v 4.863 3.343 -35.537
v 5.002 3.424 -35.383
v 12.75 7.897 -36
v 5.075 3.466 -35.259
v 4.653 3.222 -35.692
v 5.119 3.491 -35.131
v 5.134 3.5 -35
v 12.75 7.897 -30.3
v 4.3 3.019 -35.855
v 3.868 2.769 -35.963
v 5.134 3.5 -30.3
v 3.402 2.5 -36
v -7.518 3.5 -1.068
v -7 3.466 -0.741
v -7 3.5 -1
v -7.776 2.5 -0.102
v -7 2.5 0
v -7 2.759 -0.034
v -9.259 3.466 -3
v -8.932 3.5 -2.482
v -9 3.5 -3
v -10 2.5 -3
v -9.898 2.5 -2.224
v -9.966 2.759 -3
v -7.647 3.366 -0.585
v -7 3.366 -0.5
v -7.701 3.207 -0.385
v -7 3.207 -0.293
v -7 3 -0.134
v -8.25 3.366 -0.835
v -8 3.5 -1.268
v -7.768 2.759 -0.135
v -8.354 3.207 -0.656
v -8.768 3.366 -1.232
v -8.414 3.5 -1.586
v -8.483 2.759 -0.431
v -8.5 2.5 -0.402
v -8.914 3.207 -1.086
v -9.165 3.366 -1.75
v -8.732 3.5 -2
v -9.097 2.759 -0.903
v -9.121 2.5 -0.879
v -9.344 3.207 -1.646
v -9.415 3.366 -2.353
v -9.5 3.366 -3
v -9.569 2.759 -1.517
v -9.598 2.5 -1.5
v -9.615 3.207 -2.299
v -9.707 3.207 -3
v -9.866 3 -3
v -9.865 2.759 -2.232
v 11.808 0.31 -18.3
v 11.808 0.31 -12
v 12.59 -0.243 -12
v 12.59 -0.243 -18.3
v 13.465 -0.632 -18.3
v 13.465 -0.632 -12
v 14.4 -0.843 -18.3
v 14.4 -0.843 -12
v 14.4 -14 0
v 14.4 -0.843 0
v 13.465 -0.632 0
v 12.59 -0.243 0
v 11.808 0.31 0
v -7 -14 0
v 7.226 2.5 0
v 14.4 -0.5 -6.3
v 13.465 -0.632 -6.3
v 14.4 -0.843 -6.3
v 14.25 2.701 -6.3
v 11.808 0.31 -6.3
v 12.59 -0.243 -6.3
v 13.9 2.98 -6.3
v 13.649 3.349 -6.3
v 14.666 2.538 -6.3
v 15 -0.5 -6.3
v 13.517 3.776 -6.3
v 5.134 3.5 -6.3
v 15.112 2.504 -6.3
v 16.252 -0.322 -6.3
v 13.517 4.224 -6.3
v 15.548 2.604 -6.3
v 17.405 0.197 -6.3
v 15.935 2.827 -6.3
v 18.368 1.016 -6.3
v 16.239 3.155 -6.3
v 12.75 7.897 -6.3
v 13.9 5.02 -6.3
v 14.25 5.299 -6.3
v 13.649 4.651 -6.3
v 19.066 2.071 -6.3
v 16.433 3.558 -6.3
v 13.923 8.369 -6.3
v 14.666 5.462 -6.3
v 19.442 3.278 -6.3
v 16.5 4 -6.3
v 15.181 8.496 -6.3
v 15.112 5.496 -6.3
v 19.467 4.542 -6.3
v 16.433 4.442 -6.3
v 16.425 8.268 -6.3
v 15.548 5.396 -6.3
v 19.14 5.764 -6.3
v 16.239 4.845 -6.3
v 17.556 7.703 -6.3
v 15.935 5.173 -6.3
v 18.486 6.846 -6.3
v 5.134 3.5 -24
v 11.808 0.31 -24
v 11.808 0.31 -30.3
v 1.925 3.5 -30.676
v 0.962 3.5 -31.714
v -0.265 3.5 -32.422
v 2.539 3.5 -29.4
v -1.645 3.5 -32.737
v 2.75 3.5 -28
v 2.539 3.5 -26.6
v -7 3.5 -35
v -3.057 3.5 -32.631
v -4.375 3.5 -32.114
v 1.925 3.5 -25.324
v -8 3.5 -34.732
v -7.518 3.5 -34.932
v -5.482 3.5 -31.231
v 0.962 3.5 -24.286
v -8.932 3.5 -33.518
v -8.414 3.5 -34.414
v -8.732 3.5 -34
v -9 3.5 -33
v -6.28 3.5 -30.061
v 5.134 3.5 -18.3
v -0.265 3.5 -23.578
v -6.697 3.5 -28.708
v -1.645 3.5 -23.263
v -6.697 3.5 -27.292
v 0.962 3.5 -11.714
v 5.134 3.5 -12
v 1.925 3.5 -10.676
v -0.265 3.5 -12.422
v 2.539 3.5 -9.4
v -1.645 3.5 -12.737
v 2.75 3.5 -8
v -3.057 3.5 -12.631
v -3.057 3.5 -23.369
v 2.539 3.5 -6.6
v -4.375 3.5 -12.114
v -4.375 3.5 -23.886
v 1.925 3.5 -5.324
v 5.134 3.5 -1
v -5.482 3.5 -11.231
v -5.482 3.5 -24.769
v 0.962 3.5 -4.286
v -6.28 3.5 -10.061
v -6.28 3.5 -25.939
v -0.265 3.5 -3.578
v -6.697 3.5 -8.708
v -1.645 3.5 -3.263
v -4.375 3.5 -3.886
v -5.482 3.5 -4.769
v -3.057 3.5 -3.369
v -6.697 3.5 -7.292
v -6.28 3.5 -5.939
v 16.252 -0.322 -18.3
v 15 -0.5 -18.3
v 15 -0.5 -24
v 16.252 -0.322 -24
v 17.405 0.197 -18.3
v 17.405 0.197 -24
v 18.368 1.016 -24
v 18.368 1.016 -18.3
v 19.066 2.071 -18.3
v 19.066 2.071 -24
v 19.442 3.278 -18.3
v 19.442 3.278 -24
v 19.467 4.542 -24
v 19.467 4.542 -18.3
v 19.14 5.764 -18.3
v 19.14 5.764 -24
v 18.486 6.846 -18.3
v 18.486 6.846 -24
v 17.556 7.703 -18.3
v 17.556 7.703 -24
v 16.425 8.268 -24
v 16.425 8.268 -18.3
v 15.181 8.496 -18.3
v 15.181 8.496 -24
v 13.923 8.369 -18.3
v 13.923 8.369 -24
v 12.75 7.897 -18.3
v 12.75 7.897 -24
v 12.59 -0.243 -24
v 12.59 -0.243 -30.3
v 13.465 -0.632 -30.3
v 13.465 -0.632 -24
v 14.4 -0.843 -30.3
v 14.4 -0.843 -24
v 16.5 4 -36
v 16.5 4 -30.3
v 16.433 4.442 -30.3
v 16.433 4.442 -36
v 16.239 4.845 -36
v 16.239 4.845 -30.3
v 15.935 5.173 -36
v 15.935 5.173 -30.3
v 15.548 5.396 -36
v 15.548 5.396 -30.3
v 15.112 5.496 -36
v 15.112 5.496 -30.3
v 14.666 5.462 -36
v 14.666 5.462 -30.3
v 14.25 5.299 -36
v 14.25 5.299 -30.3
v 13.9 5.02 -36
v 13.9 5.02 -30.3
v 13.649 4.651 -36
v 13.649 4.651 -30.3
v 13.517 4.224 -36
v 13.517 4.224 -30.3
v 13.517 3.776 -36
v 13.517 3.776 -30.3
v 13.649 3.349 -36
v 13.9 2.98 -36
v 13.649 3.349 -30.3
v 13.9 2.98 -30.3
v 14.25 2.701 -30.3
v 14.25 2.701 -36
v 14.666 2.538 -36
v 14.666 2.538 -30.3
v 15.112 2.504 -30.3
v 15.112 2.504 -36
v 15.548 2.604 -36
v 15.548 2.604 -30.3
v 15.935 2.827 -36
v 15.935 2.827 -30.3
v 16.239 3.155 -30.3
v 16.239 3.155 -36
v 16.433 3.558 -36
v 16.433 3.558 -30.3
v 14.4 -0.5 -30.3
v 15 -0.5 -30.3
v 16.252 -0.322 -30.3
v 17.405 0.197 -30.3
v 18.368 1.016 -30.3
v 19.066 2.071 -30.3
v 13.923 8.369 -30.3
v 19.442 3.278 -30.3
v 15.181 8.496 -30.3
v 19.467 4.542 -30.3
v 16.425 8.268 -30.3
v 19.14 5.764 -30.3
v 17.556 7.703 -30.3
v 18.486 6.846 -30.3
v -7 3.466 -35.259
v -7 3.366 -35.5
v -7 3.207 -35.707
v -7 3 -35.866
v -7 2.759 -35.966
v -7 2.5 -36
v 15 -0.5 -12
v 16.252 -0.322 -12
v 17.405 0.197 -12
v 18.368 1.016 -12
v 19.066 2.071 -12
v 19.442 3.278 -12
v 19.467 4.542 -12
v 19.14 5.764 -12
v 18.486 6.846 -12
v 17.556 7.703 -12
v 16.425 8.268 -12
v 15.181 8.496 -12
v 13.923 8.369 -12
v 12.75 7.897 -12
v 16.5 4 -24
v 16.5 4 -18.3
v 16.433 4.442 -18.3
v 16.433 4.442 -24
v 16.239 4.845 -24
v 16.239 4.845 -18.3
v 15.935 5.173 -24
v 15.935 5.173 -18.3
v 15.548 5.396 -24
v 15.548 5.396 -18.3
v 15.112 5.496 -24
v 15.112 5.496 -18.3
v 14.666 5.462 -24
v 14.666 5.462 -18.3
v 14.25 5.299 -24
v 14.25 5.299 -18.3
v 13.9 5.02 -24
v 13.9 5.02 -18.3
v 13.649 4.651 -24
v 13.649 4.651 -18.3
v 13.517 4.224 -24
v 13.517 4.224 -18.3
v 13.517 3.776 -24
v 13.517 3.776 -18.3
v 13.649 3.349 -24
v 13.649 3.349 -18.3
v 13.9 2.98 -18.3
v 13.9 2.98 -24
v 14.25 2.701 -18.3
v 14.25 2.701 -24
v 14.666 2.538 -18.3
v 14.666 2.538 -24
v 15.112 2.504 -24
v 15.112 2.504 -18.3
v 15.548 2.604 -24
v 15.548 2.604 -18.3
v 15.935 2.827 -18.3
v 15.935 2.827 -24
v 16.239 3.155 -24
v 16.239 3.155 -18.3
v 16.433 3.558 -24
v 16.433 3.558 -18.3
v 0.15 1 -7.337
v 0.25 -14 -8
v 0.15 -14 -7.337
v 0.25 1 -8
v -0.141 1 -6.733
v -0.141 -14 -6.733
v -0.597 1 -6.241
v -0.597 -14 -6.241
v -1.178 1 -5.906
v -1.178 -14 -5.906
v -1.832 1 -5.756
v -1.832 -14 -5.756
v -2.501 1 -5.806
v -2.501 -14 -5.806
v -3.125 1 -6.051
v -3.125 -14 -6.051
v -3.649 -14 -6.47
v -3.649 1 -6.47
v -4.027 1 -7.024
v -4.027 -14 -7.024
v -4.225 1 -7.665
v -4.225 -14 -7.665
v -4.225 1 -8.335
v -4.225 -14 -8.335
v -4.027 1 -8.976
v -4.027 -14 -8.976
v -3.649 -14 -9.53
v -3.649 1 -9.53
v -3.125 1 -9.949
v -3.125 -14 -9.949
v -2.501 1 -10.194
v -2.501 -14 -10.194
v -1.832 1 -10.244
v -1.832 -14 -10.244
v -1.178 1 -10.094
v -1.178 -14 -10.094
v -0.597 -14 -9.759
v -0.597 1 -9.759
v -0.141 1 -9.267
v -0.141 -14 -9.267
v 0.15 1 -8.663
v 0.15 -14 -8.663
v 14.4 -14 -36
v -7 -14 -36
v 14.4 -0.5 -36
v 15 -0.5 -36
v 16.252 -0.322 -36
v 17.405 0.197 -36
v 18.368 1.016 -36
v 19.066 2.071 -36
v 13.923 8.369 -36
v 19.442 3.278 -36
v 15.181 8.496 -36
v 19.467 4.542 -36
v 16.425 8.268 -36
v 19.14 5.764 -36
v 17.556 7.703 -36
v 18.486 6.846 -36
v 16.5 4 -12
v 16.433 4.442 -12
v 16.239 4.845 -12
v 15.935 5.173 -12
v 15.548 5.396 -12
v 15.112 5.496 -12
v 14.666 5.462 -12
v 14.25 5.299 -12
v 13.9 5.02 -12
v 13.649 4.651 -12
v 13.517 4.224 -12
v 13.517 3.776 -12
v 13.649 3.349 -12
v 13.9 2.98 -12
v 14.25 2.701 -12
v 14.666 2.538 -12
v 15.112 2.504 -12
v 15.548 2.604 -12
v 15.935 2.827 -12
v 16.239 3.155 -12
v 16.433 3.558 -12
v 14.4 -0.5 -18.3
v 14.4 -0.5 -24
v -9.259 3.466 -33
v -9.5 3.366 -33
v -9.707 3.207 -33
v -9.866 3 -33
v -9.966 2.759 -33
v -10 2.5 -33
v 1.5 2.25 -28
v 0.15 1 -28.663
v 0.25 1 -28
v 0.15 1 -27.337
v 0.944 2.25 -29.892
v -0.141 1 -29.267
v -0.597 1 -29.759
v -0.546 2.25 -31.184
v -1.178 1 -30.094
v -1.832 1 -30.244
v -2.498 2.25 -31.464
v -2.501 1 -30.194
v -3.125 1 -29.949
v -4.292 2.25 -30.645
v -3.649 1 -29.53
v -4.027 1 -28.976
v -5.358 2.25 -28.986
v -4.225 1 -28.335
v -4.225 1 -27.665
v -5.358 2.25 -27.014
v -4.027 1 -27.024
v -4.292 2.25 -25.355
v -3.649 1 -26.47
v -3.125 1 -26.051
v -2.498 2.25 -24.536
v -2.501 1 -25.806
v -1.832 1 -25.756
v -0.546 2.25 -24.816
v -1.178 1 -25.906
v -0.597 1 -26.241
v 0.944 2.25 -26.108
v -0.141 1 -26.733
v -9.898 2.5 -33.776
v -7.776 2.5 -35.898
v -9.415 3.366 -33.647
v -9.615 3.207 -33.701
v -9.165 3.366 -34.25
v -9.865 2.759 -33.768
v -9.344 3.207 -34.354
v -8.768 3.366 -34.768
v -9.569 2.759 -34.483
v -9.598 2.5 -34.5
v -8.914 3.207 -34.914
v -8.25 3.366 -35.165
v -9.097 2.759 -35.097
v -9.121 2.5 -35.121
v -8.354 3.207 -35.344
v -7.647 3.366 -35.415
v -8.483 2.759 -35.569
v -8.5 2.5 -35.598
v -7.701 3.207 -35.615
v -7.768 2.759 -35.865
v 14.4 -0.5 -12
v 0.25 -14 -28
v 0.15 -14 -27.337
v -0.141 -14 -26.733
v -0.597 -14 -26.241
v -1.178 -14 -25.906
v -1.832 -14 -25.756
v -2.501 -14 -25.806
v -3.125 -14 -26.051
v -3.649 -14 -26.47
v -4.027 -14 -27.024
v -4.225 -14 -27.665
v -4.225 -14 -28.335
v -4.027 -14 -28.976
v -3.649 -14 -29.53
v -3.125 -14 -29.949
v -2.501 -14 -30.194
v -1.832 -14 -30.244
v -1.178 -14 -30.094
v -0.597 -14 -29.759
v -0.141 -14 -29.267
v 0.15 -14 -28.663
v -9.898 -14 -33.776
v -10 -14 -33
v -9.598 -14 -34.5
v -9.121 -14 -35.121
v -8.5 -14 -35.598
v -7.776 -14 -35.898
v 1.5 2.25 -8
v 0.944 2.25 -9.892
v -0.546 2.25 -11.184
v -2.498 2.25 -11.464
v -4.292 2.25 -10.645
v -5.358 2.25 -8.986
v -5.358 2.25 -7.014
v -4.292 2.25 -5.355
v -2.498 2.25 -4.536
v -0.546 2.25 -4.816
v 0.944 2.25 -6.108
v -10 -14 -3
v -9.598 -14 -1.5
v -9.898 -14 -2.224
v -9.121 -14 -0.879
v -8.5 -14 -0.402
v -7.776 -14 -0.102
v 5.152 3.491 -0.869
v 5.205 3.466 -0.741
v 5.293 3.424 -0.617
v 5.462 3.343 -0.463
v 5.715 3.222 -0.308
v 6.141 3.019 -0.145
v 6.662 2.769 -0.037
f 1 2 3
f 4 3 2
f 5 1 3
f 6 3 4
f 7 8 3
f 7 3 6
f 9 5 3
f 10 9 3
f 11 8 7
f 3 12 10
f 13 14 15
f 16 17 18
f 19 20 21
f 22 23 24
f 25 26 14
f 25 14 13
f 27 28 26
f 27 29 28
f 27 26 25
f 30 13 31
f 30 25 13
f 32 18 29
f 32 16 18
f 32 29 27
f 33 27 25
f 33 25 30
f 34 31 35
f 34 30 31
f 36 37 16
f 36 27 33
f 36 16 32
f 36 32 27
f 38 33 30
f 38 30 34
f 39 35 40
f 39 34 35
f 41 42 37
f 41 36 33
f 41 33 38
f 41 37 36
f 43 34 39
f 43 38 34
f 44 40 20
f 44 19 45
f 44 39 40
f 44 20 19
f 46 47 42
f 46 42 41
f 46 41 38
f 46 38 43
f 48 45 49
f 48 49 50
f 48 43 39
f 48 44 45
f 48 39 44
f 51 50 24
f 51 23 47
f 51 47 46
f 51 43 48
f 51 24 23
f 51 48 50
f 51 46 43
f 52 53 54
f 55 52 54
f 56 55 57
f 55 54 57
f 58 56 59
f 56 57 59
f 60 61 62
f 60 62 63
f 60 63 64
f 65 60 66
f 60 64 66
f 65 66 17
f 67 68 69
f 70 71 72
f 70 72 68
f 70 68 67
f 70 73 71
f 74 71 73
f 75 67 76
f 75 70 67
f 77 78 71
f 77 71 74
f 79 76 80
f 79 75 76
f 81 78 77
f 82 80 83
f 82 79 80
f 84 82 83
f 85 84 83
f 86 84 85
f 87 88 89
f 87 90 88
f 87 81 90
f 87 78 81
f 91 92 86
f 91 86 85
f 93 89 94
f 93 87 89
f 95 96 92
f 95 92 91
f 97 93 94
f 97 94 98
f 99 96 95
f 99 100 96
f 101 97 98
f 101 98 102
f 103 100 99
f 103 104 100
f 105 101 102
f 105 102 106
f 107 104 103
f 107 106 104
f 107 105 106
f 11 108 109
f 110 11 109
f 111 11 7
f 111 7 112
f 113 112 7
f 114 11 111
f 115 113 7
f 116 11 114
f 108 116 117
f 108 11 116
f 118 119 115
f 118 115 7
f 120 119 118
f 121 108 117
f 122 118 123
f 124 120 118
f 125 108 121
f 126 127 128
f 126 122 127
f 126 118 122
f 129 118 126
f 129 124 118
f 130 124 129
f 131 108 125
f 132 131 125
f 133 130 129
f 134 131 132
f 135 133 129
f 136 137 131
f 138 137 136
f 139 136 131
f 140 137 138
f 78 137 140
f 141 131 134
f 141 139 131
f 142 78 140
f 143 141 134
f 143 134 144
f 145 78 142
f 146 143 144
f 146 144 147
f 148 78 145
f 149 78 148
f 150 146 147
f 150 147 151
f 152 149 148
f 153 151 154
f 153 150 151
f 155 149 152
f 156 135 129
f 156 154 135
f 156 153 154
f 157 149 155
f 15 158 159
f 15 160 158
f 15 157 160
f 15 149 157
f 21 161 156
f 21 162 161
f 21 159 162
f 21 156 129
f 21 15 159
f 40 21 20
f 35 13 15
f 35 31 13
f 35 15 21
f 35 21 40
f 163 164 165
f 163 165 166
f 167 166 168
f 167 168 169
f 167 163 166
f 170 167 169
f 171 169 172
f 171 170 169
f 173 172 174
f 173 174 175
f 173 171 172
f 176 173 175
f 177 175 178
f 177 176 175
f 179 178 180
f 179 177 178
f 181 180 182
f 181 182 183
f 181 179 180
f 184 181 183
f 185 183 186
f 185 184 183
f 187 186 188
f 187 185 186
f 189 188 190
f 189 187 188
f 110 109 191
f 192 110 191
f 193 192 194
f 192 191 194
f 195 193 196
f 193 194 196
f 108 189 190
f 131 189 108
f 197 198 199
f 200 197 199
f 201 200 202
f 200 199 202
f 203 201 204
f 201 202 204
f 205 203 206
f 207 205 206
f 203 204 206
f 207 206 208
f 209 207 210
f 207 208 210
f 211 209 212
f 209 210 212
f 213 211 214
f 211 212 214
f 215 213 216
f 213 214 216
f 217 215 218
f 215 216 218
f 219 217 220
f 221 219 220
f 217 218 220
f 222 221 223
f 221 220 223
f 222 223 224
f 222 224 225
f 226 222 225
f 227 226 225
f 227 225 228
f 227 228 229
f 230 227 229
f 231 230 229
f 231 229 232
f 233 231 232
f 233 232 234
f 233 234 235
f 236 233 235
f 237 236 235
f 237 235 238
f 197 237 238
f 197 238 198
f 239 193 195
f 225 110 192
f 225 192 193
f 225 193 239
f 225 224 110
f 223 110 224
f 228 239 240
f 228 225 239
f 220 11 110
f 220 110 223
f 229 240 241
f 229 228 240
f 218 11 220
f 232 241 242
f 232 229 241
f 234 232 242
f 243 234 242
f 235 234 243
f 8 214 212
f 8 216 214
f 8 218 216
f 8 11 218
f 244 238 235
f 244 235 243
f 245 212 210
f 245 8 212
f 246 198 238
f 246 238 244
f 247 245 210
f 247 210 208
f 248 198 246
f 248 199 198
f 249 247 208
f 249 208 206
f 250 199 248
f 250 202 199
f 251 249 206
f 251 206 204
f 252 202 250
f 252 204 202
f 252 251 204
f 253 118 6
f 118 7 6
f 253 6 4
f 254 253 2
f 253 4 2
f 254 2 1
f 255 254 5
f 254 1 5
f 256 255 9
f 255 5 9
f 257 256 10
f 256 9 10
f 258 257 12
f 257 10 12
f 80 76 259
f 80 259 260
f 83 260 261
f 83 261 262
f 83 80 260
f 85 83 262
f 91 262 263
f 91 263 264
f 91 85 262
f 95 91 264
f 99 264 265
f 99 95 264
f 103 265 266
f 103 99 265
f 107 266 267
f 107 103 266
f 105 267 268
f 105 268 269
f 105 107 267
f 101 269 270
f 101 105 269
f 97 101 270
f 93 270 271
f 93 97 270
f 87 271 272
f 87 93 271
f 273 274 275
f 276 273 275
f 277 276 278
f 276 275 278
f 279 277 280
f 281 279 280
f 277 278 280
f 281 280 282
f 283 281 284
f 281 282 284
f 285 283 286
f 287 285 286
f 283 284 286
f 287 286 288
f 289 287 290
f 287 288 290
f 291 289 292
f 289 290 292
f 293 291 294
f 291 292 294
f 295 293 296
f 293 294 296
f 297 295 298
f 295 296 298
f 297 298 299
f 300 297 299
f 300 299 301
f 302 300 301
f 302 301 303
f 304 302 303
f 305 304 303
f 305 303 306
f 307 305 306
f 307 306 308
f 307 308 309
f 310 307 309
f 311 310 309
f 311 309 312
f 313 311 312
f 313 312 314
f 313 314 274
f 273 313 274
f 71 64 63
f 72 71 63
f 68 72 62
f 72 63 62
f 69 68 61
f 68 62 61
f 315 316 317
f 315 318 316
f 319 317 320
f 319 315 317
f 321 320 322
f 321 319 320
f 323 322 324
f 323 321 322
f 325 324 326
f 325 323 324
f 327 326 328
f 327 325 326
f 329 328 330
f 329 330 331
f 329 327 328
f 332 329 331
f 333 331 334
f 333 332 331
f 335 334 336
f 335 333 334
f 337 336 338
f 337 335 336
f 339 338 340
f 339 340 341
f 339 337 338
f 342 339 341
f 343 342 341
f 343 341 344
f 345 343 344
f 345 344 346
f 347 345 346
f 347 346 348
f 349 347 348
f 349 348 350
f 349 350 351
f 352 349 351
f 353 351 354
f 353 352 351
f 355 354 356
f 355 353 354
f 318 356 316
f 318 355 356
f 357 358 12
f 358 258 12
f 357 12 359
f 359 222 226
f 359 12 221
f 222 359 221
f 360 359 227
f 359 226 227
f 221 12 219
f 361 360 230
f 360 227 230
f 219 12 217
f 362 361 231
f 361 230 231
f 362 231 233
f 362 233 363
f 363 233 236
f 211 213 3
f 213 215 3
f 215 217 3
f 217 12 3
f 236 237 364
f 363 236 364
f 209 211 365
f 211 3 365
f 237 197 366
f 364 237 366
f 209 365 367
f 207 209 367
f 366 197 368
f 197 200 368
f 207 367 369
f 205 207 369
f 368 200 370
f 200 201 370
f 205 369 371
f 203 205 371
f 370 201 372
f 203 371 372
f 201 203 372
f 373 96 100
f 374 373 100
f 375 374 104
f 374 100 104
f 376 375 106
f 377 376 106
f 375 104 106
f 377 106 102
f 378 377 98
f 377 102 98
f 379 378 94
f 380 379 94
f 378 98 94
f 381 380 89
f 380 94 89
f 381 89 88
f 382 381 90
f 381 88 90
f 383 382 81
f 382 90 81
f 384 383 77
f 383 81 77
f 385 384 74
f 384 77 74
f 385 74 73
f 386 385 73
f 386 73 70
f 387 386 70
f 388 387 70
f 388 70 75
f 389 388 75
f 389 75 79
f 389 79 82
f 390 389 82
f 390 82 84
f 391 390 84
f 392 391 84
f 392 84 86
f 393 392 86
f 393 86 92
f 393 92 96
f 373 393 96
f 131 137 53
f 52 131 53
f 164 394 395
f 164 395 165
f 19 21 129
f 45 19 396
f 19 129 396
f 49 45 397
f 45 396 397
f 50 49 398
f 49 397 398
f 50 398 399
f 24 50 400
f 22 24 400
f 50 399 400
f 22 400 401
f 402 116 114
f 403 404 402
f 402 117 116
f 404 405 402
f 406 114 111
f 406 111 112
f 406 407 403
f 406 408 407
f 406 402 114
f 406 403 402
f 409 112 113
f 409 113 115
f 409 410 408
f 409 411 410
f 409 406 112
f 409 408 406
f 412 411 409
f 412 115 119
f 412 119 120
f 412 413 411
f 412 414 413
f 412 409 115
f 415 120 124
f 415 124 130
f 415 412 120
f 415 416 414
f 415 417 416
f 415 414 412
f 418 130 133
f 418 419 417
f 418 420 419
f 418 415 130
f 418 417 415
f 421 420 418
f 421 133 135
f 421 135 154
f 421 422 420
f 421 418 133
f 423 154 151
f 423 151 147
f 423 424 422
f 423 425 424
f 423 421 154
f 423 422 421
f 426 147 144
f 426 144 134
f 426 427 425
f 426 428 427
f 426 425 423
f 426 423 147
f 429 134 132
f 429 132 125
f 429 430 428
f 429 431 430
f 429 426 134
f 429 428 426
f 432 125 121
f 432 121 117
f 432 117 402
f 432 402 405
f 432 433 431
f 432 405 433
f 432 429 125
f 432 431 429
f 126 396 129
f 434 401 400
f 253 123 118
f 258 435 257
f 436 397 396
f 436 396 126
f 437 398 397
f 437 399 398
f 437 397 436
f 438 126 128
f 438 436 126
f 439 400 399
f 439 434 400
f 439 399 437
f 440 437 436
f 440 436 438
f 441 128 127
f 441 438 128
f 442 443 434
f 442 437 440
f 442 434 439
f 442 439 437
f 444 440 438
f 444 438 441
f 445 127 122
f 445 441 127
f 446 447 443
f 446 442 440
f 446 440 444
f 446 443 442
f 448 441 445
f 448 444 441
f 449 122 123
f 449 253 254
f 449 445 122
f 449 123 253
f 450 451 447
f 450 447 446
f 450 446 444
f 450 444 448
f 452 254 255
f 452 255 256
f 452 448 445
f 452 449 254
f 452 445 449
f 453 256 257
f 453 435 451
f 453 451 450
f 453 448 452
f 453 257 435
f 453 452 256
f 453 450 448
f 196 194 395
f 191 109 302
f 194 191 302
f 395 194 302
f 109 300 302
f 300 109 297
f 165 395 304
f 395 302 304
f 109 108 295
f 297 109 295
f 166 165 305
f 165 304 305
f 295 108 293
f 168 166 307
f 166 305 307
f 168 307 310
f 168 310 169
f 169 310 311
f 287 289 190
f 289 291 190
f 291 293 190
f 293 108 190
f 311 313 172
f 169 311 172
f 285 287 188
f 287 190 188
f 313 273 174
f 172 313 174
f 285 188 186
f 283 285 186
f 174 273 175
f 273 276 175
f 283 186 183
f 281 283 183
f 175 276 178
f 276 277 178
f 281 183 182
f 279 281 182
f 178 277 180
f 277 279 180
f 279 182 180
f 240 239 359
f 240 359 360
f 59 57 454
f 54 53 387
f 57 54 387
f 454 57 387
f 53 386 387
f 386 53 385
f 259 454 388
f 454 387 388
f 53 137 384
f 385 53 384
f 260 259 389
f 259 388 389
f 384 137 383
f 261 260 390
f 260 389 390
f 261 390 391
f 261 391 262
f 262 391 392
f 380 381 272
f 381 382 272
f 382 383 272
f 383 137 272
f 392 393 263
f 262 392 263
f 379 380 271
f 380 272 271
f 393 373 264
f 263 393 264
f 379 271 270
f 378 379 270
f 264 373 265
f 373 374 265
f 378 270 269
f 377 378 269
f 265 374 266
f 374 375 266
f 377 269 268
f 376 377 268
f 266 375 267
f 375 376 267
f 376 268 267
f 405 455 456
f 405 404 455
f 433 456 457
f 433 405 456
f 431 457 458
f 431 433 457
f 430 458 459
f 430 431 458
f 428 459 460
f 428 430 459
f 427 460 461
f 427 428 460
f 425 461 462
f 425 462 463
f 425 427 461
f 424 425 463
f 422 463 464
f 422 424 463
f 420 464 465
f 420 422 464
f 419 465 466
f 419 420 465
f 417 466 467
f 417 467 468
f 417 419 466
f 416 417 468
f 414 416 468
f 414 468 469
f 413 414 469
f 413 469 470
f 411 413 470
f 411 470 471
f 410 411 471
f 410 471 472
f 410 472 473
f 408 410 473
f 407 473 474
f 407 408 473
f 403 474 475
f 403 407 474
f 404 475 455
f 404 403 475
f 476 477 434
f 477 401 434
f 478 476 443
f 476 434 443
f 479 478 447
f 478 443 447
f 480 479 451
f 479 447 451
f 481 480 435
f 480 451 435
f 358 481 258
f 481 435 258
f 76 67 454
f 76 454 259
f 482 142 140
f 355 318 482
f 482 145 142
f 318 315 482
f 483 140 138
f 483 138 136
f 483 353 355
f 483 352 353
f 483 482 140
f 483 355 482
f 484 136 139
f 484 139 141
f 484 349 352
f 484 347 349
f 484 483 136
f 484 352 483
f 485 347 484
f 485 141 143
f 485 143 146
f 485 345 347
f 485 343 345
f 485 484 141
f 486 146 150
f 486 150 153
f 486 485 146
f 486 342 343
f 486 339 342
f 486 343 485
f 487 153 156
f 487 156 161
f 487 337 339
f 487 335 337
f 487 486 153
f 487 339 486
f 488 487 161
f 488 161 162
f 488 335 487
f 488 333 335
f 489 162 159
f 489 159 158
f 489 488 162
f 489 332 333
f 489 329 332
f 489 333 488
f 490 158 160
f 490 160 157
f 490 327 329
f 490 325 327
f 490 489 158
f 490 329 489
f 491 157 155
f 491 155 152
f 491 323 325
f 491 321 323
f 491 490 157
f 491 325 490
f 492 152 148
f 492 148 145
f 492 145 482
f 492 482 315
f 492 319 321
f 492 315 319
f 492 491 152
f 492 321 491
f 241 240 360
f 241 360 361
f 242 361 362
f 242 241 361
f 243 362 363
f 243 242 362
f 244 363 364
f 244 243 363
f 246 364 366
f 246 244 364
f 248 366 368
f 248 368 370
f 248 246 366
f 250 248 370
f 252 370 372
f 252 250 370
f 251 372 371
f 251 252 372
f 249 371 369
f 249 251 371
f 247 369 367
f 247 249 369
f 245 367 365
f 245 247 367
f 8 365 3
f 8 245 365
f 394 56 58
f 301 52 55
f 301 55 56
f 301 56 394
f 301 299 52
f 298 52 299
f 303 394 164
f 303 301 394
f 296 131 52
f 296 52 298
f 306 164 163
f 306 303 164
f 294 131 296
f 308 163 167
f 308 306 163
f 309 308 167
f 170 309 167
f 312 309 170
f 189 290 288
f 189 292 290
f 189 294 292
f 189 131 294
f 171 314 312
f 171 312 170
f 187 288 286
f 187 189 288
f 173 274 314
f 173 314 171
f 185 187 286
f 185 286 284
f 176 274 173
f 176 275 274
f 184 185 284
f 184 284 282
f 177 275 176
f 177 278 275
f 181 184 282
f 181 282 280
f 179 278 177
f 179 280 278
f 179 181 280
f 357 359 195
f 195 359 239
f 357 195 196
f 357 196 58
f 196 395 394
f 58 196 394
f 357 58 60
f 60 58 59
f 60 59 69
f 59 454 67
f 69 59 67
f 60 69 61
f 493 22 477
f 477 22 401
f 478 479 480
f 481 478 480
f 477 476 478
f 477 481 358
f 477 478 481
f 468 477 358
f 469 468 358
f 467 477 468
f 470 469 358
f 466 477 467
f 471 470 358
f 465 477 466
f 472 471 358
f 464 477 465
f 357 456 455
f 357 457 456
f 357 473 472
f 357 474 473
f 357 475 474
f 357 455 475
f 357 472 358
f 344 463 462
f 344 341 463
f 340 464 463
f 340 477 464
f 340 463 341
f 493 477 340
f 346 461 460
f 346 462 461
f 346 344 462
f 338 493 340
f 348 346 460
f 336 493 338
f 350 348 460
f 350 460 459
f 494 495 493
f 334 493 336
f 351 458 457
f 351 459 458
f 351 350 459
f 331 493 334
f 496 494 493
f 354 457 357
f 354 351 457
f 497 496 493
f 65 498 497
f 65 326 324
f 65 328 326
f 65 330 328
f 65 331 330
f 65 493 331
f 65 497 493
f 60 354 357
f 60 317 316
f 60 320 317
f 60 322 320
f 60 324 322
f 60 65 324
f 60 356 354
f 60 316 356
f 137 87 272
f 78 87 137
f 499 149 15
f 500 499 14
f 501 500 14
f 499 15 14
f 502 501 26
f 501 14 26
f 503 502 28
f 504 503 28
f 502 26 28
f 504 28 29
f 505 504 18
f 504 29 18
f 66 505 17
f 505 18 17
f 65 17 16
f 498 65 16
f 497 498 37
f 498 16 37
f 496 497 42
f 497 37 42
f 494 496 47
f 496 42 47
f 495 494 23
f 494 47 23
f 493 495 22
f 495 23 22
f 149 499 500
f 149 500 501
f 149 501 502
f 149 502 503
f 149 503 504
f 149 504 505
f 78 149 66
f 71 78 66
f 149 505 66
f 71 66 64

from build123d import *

# Parameters (mm, degrees)
CROQUIS1_R              = 1.5
SALIENTE_EXTRUIR1_DEPTH = 36
CORTAR_EXTRUIR1_DEPTH   = 6.3
MATRIZL1_COUNT          = 3
MATRIZL1_PITCH          = 12
CROQUIS3_R              = 2.25
CORTAR_EXTRUIR2_DEPTH   = 8.5
CHAFL_N1_SIZE           = 2.5
REDONDEO1_R             = 3
REDONDEO2_R             = 1
SKETCH1_R               = 2.25
BOSS_EXTRUDE2_DEPTH     = 10


with BuildPart() as part:
    # Croquis1 → Saliente-Extruir1 (new body)
    with BuildSketch(Plane.XY):
        with BuildLine():
            Line((12.75, 7.897114317), (5.133974596, 3.5))
            Line((5.133974596, 3.5), (-10, 3.5))
            Line((-10, 3.5), (-10, -4))
            Line((-10, -4), (14.4, -4))
            Line((14.4, -4), (14.4, -0.5))
            Line((14.4, -0.5), (15, -0.5))
            ThreePointArc((15, -0.5), (19.346666218, 5.164685703), (12.75, 7.897114317))
        make_face()
        with Locations((15, 4)):
            Circle(CROQUIS1_R, mode=Mode.SUBTRACT)
    extrude(amount=-SALIENTE_EXTRUIR1_DEPTH)

    # Croquis2 → Cortar-Extruir1 (cut)
    with BuildSketch(Plane.XY):
        with BuildLine():
            Line((14.4, -0.842600764), (15, -0.5))
            ThreePointArc((15, -0.5), (19.346666218, 5.164685703), (12.75, 7.897114317))
            Line((12.75, 7.897114317), (5.133974596, 3.5))
            Line((5.133974596, 3.5), (11.80761005, 0.309549003))
            ThreePointArc((11.80761005, 0.309549003), (13.018228657, -0.459076642), (14.4, -0.842600764))
        make_face()
    cortar_extruir1 = extrude(amount=-CORTAR_EXTRUIR1_DEPTH, mode=Mode.SUBTRACT)

    # MatrizL1: Cortar-Extruir1 ×3
    with Locations(*[(0, 0, -i * MATRIZL1_PITCH) for i in range(1, MATRIZL1_COUNT)]):
        add(cortar_extruir1, mode=Mode.SUBTRACT)

    # Croquis3 → Cortar-Extruir2 (cut, through all)
    with BuildSketch(Plane(origin=(0, 3.5, 0), x_dir=(1, 0, 0), z_dir=(0, 1, 0))):
        with Locations((-2, 28)):
            Circle(CROQUIS3_R)
        with Locations((-2, 8)):
            Circle(CROQUIS3_R)
    extrude(amount=-CORTAR_EXTRUIR2_DEPTH, mode=Mode.SUBTRACT)

    # Chaflán1
    chafl_n1_edges = [part.edges().sort_by_distance(p)[0] for p in [
        (-4.25, 3.5, -28),
        (-4.25, 3.5, -8),
    ]]
    chamfer(chafl_n1_edges, length=CHAFL_N1_SIZE)

    # Redondeo1
    redondeo1_edges = [part.edges().sort_by_distance(p)[0] for p in [
        (-10, -0.25, -36),
        (-10, -0.25, 0),
    ]]
    fillet(redondeo1_edges, radius=REDONDEO1_R)

    # Redondeo2
    redondeo2_edges = [part.edges().sort_by_distance(p)[0] for p in [
        (-10, 3.5, -18),
        (-9.121320344, 3.5, -0.878679656),
        (-9.121320344, 3.5, -35.121320344),
        (-0.933012702, 3.5, -36),
        (-0.933012702, 3.5, 0),
    ]]
    fillet(redondeo2_edges, radius=REDONDEO2_R)

    # Sketch1 → Boss-Extrude2 (add)
    with BuildSketch(Plane.XZ.offset(4)):
        with BuildLine():
            Line((-10, -3), (-10, -33))
            ThreePointArc((-10, -33), (-9.121320344, -35.121320344), (-7, -36))
            Line((-7, -36), (14.4, -36))
            Line((14.4, -36), (14.4, 0))
            Line((14.4, 0), (-7, 0))
            ThreePointArc((-7, 0), (-9.121320344, -0.878679656), (-10, -3))
        make_face()
        with Locations((-2, -8)):
            Circle(SKETCH1_R, mode=Mode.SUBTRACT)
        with Locations((-2, -28)):
            Circle(SKETCH1_R, mode=Mode.SUBTRACT)
    extrude(amount=BOSS_EXTRUDE2_DEPTH)


solid = part.part
